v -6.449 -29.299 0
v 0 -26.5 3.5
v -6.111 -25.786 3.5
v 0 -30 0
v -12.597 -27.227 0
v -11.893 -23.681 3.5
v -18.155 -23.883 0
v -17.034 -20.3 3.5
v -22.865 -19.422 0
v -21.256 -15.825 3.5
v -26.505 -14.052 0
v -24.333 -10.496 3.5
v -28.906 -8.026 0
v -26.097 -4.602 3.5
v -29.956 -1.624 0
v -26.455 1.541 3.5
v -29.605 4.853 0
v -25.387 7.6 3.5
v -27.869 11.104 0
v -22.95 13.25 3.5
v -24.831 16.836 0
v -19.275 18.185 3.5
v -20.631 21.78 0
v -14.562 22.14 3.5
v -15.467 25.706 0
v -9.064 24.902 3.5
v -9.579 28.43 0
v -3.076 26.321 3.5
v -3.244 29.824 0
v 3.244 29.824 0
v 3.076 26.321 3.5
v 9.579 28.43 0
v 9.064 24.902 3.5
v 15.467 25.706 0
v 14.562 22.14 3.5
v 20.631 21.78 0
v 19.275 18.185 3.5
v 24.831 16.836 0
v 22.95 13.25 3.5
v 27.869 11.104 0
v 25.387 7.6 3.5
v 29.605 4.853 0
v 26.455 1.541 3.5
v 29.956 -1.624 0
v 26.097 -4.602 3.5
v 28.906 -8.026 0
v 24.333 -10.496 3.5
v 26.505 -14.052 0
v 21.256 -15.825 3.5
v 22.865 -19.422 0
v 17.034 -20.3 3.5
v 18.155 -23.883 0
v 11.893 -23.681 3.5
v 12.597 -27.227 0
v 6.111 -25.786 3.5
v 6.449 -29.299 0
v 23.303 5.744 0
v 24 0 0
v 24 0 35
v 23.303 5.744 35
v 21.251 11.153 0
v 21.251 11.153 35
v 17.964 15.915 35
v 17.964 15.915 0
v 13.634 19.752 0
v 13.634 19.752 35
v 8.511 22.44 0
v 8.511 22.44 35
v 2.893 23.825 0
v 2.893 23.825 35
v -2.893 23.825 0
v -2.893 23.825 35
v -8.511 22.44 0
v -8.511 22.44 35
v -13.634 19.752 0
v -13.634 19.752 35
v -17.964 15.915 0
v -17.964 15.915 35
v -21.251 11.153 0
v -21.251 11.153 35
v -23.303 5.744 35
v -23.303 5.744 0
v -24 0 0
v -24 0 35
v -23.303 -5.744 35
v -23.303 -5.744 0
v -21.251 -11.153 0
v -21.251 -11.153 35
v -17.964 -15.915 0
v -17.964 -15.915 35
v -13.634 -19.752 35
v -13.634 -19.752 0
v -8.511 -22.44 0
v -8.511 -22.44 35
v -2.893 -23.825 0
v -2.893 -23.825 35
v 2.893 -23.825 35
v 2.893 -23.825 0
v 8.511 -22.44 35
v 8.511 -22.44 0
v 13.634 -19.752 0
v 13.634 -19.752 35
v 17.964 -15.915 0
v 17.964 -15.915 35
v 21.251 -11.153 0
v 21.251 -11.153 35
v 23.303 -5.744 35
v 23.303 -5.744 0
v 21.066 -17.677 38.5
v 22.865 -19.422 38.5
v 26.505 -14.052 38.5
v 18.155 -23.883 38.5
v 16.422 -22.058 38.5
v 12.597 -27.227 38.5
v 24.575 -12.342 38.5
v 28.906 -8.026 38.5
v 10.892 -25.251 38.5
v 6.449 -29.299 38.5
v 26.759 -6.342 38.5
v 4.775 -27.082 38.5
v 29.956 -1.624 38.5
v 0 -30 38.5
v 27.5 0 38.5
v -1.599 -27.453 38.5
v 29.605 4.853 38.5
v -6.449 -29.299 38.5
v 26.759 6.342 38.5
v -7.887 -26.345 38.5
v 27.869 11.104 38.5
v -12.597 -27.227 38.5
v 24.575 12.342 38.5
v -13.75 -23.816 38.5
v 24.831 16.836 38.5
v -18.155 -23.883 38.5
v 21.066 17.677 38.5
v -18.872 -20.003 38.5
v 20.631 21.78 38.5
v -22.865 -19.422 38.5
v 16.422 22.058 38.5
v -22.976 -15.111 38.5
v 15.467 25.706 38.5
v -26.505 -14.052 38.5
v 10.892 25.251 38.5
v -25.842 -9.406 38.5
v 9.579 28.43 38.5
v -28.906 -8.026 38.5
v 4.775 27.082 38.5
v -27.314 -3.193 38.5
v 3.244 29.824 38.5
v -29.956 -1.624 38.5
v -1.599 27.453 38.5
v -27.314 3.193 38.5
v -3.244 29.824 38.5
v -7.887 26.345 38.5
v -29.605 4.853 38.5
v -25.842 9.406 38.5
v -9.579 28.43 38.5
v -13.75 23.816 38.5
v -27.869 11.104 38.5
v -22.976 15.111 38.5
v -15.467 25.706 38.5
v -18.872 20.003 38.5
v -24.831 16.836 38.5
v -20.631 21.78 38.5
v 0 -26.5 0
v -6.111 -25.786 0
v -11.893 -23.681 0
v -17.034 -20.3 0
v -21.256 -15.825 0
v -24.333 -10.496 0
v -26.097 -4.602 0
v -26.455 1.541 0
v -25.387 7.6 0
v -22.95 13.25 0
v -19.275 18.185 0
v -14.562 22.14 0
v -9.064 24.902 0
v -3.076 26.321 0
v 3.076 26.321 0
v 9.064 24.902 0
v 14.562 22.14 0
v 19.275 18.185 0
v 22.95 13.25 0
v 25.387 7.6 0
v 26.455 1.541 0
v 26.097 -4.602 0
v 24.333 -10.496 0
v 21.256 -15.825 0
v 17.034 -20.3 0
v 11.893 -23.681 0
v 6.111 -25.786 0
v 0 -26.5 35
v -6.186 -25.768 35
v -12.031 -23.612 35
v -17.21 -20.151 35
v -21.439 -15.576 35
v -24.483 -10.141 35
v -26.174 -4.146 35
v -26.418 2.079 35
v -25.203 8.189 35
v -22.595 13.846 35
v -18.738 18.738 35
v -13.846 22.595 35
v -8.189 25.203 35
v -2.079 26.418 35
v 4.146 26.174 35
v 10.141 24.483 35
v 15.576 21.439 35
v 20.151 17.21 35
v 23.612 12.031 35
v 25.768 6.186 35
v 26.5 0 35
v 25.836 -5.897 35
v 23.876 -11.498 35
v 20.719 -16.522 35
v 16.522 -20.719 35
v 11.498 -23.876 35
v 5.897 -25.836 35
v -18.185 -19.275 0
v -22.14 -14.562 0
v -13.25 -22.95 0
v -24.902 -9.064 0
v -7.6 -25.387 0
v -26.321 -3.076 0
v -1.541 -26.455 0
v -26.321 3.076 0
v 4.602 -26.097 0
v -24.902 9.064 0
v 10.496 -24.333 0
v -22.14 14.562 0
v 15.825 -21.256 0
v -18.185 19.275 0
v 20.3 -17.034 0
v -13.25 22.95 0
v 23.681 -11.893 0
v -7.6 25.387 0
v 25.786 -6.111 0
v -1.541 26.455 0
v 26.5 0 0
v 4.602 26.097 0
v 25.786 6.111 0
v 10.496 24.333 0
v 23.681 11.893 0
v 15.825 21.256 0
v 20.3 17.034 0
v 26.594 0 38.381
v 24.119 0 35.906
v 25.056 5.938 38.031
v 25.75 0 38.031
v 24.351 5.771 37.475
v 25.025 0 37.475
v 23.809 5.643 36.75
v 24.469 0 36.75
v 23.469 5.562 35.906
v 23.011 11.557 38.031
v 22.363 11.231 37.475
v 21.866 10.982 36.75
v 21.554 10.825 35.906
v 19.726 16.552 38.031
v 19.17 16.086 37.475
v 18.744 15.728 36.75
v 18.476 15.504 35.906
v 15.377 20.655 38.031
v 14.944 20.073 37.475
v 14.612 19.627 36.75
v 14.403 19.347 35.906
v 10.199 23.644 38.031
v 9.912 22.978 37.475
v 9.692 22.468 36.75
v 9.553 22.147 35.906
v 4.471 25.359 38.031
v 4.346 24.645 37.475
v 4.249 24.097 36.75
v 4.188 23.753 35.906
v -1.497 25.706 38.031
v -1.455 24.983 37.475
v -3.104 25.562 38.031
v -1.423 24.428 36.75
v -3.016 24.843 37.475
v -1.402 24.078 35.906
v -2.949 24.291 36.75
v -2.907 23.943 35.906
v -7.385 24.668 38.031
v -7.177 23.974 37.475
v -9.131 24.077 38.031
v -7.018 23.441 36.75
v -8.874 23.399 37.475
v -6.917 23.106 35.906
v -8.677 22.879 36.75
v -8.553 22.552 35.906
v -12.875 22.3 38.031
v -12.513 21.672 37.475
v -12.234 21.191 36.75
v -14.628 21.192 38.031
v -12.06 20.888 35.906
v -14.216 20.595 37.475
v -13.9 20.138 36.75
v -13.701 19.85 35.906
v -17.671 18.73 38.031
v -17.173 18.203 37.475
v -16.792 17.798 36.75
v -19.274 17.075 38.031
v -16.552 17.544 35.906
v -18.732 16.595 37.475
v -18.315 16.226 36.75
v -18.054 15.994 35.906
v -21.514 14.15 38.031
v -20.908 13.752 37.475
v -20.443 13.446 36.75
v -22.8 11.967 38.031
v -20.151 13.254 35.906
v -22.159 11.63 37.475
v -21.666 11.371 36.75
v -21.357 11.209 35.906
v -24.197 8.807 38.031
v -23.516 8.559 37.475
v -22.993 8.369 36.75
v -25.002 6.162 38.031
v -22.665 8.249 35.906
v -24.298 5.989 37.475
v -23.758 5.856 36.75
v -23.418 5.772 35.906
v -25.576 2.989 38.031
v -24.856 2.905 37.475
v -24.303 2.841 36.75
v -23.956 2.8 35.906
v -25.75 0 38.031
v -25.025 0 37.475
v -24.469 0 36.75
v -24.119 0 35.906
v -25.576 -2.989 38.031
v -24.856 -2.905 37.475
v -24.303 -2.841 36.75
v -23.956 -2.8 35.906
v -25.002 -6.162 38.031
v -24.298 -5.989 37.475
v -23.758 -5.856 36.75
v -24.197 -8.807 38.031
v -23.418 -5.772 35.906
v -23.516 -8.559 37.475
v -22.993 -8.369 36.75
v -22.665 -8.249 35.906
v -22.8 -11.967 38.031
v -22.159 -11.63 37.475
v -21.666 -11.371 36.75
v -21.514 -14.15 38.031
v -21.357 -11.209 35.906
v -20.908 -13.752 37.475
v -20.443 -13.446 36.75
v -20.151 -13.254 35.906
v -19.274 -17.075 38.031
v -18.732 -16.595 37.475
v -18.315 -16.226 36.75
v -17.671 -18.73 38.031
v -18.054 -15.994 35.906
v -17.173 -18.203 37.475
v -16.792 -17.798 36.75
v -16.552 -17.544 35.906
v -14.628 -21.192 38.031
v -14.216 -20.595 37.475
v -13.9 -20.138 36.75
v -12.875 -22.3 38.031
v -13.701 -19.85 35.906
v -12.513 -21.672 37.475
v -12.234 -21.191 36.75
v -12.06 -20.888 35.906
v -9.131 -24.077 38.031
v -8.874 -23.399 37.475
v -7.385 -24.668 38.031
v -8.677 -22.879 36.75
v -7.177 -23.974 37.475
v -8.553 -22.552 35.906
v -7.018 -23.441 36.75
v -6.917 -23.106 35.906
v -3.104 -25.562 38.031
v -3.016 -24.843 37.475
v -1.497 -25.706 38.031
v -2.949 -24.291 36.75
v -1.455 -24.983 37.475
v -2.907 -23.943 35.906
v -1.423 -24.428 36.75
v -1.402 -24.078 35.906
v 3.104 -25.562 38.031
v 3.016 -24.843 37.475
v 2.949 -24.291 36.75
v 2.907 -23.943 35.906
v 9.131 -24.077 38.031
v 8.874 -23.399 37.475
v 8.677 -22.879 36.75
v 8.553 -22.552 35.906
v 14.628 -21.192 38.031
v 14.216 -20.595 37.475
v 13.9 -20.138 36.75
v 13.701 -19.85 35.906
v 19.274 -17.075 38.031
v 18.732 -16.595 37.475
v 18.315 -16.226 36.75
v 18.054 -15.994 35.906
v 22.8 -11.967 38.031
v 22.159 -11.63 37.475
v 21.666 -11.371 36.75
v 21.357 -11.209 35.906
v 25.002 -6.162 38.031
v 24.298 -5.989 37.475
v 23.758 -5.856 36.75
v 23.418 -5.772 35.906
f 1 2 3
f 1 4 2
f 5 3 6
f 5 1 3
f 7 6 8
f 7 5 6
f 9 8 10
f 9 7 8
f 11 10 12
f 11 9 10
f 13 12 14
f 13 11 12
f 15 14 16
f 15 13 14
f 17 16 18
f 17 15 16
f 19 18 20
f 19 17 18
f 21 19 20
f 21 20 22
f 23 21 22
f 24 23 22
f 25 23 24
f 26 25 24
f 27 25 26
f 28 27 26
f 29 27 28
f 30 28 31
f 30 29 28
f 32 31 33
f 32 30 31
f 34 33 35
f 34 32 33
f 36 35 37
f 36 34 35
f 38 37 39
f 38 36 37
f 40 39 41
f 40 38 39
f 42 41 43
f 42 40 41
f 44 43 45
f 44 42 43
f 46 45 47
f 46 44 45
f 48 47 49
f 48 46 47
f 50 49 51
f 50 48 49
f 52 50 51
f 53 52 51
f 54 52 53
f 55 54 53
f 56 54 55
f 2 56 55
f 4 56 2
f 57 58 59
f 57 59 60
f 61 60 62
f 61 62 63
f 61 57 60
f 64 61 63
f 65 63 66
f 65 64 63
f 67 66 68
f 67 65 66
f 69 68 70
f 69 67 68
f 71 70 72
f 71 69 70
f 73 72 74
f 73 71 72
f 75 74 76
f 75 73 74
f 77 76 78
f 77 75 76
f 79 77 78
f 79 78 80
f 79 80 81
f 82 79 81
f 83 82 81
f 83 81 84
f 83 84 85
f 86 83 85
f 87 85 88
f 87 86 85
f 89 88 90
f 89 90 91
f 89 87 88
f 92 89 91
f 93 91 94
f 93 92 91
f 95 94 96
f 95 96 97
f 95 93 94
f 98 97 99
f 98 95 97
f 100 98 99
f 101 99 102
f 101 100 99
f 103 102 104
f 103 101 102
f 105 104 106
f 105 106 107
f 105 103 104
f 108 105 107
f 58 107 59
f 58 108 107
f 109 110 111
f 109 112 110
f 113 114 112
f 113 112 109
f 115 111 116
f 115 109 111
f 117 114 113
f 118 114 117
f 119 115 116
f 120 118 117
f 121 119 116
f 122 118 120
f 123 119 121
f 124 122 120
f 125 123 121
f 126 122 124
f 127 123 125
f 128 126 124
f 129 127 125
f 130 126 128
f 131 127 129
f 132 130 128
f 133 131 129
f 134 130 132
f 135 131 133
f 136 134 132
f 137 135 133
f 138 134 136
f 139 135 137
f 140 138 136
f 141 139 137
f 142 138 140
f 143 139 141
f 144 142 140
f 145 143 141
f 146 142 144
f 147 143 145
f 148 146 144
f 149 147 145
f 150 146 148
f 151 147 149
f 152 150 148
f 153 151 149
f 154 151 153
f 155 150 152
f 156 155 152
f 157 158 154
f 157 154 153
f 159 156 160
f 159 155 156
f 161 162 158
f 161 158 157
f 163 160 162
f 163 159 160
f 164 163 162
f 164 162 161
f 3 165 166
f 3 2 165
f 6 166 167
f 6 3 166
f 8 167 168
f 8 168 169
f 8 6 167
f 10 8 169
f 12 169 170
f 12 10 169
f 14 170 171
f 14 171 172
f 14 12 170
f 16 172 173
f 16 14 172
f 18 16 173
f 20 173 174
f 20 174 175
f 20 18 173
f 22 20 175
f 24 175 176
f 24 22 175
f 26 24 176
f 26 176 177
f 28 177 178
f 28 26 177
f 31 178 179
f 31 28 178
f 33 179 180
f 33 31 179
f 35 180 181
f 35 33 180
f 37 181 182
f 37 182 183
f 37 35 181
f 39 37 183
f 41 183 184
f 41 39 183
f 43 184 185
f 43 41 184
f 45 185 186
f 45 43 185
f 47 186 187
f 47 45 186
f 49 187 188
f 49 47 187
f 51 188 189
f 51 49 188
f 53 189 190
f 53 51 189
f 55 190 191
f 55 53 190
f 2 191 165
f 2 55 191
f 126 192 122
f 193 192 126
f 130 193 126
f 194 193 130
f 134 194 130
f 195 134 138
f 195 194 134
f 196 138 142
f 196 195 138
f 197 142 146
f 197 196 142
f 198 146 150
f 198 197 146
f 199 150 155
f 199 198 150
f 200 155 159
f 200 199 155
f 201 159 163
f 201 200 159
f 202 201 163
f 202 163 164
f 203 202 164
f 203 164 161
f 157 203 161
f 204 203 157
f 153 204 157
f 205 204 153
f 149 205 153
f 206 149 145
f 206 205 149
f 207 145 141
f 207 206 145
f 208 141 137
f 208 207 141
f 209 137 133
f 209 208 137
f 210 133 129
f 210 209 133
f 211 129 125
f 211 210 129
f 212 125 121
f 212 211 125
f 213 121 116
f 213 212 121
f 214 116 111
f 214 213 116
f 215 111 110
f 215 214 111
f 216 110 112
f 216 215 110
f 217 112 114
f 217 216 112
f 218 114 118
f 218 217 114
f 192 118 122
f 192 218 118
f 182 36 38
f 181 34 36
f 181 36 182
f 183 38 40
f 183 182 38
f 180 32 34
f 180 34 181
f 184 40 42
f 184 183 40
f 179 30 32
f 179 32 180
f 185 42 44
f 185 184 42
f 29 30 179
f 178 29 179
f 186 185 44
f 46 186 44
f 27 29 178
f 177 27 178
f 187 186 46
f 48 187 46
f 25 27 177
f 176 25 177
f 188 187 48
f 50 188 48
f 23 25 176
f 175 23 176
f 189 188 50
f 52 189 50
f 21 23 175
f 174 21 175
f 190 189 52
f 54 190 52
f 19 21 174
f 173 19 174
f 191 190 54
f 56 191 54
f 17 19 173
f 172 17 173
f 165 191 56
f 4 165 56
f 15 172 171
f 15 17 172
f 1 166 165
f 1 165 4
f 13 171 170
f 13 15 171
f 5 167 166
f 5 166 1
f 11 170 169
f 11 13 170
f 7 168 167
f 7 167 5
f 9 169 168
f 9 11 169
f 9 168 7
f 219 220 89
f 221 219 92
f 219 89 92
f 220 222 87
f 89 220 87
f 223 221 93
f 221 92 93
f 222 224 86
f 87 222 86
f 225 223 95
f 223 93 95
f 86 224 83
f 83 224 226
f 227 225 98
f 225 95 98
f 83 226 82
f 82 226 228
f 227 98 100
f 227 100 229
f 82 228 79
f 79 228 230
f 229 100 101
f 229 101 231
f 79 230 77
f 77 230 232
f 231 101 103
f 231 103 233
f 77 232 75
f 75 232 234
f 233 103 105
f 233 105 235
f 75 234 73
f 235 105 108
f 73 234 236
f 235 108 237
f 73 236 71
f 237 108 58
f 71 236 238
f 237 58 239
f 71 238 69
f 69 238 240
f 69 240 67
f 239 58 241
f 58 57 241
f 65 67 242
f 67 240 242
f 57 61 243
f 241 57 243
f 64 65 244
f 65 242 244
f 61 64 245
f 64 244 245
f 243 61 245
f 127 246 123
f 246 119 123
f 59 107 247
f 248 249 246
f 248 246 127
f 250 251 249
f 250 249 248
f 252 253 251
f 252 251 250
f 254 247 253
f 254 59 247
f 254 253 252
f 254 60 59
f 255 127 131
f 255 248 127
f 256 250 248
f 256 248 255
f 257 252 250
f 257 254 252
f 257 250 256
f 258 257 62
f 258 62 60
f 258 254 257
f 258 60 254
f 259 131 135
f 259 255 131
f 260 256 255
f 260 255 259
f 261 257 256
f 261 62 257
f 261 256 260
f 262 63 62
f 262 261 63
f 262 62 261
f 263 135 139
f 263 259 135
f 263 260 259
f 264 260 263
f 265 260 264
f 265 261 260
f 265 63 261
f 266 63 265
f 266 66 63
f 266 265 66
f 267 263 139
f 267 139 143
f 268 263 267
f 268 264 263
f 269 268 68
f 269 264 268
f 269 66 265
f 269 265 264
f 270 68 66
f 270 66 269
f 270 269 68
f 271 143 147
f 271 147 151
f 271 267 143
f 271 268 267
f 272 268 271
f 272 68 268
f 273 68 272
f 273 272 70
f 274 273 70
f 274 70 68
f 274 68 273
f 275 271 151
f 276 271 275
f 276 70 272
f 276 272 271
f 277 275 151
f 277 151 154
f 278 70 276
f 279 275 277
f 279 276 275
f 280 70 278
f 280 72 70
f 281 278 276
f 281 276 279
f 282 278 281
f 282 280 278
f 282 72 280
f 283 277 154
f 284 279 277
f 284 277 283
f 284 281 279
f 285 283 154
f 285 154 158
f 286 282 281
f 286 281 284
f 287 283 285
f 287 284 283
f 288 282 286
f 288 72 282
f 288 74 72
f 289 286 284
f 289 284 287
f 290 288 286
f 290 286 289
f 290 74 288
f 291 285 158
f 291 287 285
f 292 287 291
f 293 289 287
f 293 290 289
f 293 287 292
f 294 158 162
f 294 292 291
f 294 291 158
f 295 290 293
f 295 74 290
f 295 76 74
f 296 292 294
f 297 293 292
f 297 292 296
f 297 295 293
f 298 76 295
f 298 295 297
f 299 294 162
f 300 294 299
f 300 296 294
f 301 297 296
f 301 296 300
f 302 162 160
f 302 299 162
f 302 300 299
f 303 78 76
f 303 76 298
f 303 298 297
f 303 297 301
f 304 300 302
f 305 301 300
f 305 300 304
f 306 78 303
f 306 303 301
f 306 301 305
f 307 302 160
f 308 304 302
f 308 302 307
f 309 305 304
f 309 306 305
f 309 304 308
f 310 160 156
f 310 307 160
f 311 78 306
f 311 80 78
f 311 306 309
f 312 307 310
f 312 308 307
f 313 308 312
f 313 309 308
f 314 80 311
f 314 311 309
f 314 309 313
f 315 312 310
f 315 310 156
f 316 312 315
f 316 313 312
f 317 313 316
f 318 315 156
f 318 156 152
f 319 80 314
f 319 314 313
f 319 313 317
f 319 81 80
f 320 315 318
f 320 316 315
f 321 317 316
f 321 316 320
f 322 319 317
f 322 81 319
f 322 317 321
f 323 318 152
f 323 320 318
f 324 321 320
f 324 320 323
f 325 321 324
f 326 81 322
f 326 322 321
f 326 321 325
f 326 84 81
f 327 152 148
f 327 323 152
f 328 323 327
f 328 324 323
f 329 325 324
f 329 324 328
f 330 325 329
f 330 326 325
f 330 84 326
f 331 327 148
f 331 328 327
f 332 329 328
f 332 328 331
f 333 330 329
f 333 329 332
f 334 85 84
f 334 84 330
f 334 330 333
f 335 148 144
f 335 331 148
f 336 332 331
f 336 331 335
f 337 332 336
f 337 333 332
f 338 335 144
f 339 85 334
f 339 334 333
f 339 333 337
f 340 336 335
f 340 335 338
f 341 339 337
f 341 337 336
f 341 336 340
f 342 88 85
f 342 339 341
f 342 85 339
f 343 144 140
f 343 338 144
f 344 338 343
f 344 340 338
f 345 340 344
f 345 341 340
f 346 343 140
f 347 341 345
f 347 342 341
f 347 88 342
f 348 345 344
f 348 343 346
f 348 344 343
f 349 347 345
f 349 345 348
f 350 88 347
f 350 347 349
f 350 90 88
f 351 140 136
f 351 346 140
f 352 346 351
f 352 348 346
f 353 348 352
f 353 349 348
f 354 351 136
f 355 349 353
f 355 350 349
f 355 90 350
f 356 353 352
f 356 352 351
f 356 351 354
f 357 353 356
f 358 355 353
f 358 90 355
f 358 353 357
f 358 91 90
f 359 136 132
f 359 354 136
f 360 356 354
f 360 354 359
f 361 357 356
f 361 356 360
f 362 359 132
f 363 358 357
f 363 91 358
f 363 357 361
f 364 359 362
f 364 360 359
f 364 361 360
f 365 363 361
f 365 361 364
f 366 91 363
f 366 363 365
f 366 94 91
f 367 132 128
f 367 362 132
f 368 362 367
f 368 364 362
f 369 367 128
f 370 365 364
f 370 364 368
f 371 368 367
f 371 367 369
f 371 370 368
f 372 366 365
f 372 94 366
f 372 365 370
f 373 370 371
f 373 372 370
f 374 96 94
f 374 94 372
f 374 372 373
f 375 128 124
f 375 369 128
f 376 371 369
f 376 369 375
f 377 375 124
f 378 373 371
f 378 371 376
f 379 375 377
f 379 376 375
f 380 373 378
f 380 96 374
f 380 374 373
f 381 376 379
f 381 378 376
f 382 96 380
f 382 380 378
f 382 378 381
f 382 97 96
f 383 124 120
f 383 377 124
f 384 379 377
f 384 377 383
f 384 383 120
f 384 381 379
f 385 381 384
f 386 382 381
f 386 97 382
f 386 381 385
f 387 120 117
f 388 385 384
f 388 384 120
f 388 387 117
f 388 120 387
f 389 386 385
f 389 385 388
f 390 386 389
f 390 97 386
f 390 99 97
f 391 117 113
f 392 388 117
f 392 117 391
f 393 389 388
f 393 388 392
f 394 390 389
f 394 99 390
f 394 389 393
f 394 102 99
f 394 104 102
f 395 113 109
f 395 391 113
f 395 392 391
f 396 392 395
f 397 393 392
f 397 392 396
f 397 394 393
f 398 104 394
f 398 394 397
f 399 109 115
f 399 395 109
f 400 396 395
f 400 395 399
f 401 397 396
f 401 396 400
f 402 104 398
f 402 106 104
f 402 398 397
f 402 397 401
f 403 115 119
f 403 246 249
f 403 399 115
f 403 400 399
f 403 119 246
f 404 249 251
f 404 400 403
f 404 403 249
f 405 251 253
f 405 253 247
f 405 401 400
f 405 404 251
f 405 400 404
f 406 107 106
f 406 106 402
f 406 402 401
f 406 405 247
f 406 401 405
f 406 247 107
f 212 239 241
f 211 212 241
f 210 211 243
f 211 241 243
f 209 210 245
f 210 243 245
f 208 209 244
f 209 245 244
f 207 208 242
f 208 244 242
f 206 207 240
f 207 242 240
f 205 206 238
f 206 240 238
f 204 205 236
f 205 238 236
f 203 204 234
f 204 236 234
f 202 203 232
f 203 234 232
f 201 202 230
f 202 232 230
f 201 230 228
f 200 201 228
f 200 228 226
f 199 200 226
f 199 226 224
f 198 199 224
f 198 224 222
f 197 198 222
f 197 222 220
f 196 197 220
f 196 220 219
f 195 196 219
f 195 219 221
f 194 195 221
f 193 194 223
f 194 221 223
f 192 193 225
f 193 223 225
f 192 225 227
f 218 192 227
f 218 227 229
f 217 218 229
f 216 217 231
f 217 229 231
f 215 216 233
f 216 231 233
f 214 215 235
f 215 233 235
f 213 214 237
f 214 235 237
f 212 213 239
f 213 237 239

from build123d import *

# Parameters (mm, degrees)
F2_R     = 26.5
F2_R_2   = 24
F3_DEPTH = 38.5
F7_R     = 3.5


with BuildPart() as f3:
    # F2 (on Top) → F3 (new body)
    with BuildSketch(Plane.XY):
        Circle(F2_R)
        Circle(F2_R_2, mode=Mode.SUBTRACT)
    extrude(amount=F3_DEPTH)

    # F4 (on Right) → F5 (revolve)
    with BuildSketch(Plane.YZ):
        Polygon((-30, 38.5), (-26.5, 35), (-26.5, 38.5), align=None)
    revolve(axis=Axis((0, 0, 19.25), (0, 0, -1)))

    # F7
    f7_edges = [f3.edges().sort_by_distance(p)[0] for p in [
        (-24, 0, 38.5),
    ]]
    fillet(f7_edges, radius=F7_R)


with BuildPart() as f6:
    # F4 (on Right) → F6 (revolve)
    with BuildSketch(Plane.YZ):
        Polygon((-30, 0), (-26.5, 0), (-26.5, 3.5), align=None)
    revolve(axis=Axis((0, 0, 0), (0, 0, -1)))


solid = Compound([f3.part, f6.part])
